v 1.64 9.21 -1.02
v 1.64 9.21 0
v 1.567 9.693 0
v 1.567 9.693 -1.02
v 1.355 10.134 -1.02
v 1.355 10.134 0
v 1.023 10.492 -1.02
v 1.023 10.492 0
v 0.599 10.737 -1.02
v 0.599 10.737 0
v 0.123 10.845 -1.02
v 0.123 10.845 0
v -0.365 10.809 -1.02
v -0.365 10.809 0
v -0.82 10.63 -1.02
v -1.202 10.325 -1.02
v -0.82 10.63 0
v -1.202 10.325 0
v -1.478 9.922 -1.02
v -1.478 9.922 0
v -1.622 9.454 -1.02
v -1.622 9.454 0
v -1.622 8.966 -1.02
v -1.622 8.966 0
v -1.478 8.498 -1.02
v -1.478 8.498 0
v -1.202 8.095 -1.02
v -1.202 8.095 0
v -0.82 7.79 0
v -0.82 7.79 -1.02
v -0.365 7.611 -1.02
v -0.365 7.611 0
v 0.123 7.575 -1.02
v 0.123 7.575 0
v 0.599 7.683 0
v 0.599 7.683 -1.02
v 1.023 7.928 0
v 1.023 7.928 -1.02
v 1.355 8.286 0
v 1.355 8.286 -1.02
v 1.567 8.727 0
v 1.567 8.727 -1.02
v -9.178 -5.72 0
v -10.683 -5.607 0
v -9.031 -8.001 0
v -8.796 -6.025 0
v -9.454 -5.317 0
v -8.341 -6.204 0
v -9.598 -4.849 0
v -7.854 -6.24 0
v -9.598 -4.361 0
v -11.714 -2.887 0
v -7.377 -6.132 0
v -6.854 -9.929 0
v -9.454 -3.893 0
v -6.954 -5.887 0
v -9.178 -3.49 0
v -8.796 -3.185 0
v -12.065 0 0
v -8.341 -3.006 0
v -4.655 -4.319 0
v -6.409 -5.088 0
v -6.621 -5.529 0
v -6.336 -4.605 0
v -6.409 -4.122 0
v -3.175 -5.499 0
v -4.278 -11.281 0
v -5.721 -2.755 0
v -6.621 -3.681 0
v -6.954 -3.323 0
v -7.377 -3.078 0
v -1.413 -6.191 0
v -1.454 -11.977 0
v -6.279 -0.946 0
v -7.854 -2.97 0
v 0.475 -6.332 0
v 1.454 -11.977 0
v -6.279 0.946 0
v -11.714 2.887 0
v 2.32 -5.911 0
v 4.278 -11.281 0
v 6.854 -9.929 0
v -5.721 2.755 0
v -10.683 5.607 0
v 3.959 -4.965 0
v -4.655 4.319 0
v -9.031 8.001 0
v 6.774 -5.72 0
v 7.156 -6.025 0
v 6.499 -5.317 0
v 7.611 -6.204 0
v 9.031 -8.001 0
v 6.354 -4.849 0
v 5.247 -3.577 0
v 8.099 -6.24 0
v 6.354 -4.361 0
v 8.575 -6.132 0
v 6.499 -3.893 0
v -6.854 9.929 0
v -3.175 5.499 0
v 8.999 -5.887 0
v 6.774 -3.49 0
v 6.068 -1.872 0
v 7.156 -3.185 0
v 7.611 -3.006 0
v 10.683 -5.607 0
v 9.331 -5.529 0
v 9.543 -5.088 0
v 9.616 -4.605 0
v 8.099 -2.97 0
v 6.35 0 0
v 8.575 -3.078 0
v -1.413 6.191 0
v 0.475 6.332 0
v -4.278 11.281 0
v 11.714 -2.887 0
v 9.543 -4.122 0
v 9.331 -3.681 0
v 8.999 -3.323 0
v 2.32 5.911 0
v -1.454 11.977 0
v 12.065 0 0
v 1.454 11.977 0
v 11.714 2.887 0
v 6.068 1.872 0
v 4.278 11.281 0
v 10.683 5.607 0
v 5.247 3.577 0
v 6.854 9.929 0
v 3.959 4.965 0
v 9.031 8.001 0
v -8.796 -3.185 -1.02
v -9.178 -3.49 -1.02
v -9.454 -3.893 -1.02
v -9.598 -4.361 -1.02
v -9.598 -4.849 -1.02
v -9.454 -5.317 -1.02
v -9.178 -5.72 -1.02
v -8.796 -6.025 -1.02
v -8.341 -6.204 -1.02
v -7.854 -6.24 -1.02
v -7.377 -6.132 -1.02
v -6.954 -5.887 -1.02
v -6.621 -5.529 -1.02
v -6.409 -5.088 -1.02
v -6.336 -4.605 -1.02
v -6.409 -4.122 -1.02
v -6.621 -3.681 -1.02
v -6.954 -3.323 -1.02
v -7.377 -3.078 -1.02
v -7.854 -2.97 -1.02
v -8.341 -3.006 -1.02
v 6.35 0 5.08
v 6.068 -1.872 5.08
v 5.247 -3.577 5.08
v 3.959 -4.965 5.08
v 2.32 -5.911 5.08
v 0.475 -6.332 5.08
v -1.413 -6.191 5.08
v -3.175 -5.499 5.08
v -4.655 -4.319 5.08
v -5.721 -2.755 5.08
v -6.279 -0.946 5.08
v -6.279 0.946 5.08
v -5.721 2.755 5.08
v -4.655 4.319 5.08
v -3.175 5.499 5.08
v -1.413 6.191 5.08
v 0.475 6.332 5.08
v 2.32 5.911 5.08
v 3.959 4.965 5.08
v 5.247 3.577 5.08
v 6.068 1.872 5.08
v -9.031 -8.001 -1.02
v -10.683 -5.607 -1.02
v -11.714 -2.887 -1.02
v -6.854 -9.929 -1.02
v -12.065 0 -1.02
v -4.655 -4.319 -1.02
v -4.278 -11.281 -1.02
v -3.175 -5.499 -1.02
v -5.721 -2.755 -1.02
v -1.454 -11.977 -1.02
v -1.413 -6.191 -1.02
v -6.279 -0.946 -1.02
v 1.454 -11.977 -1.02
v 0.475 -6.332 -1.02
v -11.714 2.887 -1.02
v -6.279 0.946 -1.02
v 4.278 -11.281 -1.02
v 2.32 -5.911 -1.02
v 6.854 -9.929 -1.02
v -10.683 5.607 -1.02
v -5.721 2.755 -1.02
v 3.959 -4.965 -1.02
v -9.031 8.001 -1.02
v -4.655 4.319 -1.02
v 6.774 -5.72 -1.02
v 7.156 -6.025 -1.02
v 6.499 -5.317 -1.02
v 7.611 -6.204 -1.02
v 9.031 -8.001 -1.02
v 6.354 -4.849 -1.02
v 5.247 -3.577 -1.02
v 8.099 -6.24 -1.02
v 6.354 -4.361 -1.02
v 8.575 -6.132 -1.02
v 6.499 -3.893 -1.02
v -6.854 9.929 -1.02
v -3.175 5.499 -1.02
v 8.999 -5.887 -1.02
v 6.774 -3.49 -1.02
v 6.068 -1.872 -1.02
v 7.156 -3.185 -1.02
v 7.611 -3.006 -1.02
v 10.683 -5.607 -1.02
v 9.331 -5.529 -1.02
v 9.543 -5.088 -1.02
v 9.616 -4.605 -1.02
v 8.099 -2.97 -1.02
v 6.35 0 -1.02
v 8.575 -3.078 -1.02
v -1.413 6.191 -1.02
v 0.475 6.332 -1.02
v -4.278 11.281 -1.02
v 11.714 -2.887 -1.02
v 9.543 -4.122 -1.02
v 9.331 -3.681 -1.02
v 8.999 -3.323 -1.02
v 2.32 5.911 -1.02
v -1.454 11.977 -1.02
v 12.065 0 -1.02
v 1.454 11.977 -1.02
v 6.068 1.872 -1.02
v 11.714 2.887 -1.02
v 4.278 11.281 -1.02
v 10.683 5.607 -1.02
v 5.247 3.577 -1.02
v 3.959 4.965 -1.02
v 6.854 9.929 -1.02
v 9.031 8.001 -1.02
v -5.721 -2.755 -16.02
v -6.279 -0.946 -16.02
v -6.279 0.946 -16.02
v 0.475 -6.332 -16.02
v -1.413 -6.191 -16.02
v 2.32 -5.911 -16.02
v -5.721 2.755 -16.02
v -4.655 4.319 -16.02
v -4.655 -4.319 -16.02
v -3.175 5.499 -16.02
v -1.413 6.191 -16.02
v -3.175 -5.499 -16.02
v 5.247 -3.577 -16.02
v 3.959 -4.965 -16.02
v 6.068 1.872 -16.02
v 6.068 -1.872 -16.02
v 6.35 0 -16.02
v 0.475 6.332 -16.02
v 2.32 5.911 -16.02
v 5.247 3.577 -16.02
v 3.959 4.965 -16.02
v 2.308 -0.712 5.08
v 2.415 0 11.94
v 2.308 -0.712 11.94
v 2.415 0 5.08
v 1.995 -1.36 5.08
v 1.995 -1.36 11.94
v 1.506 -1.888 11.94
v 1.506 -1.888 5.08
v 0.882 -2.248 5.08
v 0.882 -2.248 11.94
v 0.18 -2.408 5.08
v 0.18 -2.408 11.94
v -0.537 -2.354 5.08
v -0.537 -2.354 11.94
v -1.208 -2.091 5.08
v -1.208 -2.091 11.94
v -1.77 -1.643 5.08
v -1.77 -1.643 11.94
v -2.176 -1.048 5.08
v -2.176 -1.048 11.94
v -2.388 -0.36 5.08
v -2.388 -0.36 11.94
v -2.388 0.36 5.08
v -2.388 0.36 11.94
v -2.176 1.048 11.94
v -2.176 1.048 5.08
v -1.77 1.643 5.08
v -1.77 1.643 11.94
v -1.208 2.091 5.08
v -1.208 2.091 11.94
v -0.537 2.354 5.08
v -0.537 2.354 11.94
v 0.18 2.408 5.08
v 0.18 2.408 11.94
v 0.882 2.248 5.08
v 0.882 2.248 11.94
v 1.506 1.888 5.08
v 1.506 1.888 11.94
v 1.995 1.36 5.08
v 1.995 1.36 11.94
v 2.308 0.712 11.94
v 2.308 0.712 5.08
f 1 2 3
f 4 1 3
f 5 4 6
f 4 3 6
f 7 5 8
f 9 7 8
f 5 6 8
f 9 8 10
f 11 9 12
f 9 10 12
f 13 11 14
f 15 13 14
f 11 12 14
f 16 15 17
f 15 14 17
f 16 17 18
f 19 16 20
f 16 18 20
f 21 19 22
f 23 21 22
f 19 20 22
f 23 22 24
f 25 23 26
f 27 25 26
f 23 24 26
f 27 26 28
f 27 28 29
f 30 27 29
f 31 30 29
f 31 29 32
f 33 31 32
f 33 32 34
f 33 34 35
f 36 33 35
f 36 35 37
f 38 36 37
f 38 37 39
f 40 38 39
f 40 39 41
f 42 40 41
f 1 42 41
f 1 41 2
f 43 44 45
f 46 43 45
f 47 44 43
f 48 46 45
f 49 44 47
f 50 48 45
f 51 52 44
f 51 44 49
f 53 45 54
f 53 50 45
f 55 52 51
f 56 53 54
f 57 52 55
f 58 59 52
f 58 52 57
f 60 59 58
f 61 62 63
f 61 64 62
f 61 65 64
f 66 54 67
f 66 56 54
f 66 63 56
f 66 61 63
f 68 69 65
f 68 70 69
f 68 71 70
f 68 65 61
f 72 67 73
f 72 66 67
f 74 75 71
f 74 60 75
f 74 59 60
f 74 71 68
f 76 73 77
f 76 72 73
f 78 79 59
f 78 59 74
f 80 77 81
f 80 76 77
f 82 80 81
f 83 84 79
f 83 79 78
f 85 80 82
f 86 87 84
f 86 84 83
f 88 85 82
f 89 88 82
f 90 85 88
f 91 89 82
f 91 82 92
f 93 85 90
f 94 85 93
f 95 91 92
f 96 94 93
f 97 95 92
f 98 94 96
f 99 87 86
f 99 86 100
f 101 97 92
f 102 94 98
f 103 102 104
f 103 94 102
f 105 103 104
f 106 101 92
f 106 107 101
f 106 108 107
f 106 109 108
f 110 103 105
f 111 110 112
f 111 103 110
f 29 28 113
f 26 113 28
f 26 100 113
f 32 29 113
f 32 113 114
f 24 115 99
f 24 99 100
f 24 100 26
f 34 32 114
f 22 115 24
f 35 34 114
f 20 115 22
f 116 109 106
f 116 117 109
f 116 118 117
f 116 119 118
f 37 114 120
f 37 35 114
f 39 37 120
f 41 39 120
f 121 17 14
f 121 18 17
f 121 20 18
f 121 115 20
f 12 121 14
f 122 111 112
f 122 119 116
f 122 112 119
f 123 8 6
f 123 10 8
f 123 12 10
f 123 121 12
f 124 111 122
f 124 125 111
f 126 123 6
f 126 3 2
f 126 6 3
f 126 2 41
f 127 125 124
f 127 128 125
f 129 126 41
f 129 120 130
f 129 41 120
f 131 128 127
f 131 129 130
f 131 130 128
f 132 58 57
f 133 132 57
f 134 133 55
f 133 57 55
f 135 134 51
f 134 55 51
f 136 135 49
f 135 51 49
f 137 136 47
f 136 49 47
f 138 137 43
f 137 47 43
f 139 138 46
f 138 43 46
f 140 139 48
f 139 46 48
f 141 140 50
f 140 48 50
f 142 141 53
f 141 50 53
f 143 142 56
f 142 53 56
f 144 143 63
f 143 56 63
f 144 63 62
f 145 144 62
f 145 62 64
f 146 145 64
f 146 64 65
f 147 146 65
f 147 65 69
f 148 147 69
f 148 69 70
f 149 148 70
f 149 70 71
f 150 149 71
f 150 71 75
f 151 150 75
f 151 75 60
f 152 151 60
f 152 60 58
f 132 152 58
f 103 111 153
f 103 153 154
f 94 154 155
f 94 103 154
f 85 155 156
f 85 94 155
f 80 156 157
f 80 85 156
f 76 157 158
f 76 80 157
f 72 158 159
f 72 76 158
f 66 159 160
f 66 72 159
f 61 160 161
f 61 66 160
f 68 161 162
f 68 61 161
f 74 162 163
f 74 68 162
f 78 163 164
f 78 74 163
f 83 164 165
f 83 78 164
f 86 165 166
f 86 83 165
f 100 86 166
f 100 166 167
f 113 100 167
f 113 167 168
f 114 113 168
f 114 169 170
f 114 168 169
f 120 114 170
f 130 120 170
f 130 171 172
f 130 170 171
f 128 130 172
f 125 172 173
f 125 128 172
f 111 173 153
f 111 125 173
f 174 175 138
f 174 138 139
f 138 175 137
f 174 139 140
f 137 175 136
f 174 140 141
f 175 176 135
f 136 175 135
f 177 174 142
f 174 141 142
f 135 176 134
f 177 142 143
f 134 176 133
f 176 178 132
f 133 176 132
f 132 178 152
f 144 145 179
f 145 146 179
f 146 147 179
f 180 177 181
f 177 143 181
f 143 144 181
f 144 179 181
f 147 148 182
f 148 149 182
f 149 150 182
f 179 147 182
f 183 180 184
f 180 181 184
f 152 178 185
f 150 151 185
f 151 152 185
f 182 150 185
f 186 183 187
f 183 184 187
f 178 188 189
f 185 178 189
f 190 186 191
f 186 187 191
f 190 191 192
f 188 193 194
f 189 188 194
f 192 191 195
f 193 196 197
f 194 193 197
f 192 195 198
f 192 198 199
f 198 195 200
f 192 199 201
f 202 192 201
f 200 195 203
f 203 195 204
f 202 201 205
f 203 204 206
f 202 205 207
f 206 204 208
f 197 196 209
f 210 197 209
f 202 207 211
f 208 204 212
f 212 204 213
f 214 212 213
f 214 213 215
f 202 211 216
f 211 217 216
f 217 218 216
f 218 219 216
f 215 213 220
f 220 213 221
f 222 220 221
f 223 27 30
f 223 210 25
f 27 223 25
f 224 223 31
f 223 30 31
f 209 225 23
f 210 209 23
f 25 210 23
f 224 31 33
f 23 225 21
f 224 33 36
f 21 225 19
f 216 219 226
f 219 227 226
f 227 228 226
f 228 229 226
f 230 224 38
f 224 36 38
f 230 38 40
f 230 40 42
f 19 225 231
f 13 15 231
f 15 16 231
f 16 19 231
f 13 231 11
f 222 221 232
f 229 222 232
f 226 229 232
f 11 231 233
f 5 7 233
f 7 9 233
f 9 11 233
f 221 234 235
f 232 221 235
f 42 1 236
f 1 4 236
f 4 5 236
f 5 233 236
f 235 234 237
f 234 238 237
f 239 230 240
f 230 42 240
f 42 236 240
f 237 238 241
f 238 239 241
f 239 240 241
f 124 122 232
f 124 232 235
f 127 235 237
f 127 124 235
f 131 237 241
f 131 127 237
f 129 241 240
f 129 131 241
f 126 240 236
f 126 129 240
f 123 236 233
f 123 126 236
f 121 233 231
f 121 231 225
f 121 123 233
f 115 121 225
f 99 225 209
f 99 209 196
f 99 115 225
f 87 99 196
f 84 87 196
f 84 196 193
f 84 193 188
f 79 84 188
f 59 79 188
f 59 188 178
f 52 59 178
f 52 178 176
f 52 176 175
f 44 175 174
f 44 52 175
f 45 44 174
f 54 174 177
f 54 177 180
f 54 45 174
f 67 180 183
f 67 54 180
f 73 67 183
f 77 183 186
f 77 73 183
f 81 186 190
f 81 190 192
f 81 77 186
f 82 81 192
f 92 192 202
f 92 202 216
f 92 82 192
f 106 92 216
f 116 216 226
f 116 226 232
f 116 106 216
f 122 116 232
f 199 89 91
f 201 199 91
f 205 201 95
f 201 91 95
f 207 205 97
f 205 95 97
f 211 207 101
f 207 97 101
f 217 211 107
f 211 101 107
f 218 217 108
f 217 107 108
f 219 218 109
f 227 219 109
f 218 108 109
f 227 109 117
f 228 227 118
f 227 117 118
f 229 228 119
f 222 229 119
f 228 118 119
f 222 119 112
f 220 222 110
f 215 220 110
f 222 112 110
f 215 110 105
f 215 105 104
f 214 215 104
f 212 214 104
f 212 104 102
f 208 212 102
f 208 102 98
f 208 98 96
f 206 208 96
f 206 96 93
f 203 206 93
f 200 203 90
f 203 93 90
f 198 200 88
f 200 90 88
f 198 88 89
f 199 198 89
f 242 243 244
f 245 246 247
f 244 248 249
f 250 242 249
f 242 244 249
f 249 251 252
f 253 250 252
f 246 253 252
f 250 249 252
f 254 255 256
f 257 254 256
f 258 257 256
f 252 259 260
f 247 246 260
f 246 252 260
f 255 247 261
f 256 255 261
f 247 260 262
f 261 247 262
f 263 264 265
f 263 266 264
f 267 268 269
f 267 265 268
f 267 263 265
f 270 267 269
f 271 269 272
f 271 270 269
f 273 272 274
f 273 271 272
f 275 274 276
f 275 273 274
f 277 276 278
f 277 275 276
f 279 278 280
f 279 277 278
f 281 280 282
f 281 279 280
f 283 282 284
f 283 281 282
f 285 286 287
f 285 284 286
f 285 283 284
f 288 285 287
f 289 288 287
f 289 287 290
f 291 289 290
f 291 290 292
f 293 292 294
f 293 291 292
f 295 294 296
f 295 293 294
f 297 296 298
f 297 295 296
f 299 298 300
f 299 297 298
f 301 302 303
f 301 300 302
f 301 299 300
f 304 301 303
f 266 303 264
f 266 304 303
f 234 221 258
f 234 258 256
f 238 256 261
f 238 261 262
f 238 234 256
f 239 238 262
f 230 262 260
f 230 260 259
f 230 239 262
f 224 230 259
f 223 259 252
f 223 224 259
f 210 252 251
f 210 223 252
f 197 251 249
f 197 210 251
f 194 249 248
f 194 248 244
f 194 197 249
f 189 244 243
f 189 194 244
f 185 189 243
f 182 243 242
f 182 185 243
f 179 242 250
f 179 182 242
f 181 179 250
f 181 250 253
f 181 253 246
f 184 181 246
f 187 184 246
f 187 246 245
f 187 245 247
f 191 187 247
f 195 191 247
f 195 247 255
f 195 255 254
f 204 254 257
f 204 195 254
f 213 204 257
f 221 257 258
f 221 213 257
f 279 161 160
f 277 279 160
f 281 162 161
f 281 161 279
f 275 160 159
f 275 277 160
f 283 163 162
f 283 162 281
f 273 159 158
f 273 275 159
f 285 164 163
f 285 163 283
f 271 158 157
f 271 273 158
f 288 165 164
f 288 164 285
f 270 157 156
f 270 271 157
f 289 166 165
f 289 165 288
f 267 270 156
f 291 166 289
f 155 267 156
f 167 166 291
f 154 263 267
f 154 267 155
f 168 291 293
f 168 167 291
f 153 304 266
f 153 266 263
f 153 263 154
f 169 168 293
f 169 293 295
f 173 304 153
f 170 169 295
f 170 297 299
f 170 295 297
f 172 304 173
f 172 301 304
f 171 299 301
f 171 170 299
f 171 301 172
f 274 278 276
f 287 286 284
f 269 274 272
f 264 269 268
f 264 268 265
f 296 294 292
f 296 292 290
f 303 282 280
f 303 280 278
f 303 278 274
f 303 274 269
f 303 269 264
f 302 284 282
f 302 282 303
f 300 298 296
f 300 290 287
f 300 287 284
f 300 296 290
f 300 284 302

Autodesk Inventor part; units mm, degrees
ref_plane "YZ Plane" through (0, 0, 0) normal (1, 0, 0) x (0, 1, 0)
ref_plane "XZ Plane" through (0, 0, 0) normal (0, 1, 0) x (-1, 0, 0)
ref_plane "XY Plane" through (0, 0, 0) normal (0, 0, 1) x (1, 0, 0)
sketch "Sketch1" plane through (0, 0, 0) normal (0, 0, 1) x (1, 0, 0)
  circle A0 centre (0, 0) radius 6.35
  dimension "d0" = 12.7
extrude "Extrusion1" add sketch "Sketch1" along normal blind 5.08 and the other way blind 16.02
sketch "Sketch4" plane through (0, 0, 0) normal (0, 0, 1) x (1, 0, 0)
  circle A0 centre (0, 0) radius 12.065
  dimension "d9" = 24.13
extrude "Extrusion3" add sketch "Sketch4" against normal blind 1.02
sketch "Sketch5" plane through (0, 0, 5.08) normal (0, 0, 1) x (1, 0, 0)
  circle A0 centre (0, 0) radius 6.35 projected
  circle A1 centre (0, 0) radius 2.415
  dimension "d12" = 4.83
extrude "Extrusion4" add sketch "Sketch5" along normal blind 6.86 contours A1
sketch "Sketch6" plane through (0, 0, 0) normal (0, 0, 1) x (1, 0, 0)
  circle A0 centre (0, 0) radius 6.35 projected
  circle A1 centre (0, 9.21) radius 1.64
  circle A2 centre (0, 0) radius 9.21 construction
  line L0 (0, 0) -> (0, 14.2117) construction
  dimension "d15" = 18.42
  dimension "d16" = 3.28
extrude "Extrusion5" cut sketch "Sketch6" against normal through all contours A1
pattern_circular "Circular Pattern1" count 3 over 360 about axis through (0, 0, -10) along (0, 0, 1) of "Extrusion5"
properties part number "Slip_Ring"
